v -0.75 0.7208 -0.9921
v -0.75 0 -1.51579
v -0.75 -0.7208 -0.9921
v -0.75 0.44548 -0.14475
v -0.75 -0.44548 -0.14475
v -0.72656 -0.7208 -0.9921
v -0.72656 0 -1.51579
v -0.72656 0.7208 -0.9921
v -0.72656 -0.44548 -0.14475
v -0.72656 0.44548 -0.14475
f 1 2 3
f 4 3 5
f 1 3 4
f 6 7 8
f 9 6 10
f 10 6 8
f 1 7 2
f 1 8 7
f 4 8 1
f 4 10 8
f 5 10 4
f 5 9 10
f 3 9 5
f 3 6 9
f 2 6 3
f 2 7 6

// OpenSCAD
translate([-0.75, 0, 0])
rotate([0, 90, 0])
linear_extrude(height=0.0234375)
    translate([0.7578947368421053, 0])
    circle(r=0.7578947368421053);
